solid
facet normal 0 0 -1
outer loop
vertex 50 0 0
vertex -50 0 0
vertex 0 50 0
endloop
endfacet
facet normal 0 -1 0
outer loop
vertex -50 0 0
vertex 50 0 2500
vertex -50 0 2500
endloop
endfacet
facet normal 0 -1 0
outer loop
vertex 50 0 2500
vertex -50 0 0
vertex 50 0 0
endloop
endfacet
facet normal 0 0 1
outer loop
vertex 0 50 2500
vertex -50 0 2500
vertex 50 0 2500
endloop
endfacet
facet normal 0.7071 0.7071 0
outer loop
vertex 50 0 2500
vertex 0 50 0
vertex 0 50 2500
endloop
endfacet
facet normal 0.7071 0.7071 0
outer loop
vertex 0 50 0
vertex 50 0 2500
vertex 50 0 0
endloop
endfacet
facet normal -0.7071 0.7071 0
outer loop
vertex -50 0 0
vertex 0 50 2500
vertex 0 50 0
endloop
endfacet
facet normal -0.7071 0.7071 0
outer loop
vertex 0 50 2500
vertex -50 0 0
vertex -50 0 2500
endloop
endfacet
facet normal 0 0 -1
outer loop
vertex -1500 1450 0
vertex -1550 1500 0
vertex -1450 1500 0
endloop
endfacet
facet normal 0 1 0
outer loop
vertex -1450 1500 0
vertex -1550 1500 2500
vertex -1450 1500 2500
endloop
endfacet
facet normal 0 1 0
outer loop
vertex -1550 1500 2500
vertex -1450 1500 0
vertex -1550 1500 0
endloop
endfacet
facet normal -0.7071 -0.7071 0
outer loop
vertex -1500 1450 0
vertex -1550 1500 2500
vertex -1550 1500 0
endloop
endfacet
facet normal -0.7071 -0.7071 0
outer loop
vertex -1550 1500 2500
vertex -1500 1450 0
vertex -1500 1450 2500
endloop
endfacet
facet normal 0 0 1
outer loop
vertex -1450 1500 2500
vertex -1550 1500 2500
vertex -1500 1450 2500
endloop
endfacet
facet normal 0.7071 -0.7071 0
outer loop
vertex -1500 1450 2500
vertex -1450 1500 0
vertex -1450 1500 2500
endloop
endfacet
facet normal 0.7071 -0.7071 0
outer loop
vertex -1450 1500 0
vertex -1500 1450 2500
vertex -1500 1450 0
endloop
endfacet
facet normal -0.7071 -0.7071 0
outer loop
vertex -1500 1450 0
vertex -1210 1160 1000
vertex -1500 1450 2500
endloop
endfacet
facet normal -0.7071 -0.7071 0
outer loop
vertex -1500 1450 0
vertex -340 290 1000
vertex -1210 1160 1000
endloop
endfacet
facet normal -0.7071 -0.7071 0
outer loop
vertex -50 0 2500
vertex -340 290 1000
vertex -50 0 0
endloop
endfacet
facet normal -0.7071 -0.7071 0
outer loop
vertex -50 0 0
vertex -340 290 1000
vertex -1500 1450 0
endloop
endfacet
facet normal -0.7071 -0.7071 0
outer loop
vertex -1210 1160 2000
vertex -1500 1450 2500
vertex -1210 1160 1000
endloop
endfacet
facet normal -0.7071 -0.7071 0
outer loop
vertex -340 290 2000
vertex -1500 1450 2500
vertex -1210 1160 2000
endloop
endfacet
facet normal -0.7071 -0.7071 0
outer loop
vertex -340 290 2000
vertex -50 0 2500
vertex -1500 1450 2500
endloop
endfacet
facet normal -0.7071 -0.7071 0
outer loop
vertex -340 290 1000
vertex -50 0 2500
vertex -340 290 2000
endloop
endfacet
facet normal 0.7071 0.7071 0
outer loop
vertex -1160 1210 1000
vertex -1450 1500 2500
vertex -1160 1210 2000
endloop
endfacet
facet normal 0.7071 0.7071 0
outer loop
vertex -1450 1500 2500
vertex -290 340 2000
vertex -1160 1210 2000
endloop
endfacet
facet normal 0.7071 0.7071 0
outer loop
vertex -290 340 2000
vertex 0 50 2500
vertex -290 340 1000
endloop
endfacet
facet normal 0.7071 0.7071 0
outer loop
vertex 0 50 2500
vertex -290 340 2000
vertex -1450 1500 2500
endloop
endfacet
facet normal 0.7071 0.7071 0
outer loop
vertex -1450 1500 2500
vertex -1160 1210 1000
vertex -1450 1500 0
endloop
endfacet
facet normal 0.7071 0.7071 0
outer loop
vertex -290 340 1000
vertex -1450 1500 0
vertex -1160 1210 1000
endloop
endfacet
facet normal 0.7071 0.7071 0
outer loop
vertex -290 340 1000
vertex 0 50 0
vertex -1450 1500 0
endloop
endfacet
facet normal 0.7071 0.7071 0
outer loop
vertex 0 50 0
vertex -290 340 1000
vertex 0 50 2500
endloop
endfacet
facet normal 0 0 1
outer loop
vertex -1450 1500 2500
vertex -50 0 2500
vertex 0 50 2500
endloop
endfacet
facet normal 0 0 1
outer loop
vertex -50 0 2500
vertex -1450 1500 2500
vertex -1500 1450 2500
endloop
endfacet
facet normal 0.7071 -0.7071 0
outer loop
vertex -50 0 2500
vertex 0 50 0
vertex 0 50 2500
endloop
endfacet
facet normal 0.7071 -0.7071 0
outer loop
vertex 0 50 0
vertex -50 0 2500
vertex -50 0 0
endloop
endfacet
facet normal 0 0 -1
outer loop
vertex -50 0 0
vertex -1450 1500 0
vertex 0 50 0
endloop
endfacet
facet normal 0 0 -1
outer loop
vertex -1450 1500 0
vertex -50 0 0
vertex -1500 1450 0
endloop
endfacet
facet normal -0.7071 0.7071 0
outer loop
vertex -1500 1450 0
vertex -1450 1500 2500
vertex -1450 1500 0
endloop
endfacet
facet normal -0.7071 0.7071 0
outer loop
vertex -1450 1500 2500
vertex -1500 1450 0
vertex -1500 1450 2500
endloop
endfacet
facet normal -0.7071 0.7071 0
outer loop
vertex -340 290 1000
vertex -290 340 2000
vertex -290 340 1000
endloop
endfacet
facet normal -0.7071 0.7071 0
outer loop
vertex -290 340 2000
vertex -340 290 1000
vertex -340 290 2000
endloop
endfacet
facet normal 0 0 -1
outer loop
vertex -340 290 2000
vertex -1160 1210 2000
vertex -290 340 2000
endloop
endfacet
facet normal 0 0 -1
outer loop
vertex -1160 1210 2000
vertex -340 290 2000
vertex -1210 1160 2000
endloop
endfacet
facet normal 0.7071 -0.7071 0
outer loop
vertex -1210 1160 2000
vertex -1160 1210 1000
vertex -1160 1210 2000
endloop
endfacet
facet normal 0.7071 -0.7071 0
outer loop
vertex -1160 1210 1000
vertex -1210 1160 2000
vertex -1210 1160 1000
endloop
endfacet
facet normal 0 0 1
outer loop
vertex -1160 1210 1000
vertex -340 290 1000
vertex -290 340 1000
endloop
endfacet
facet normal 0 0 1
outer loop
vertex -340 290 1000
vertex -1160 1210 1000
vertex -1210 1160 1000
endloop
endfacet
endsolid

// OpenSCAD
// file: templates/basic-dims.scad
unit = 1000;

section_width = unit * 1.5;
section_height = unit * 2.5;
section_thickness = unit * 0.1;

rt = sqrt(2);

//  -- Notes --
//  Z is UP
//  X is FORWARD (out of the screen)
// file: modifiers/diagonalize.scad
include <../templates/basic-dims.scad>

module diagonalize_triangle_sketch(t = section_thickness) {
    x = sin(45) * t;
    y = cos(45) * t;

    polygon([
        [0, y],
        [x, 0],
        [0, -y]
    ]);
}

module diagonalize_triangle(t = section_thickness) {
    rotate([0, 0, 90])
    linear_extrude(section_height)
    diagonalize_triangle_sketch(t);
}

module diagonalize2D() {
    thickness = section_thickness / rt;

    trans = (section_thickness/2)*rt/2;
    len_scale = rt - section_thickness / (rt * section_width);

    rotate([0, 0, 45])
    translate([trans, 0, 0])
    scale([len_scale, 1/rt, 1])
    children();
}


module diagonalize3D(w = section_width, t = section_thickness, edges = "trans") {

    trans = (t/2)*rt/2;
    len_scale = rt - t / (rt * w);

    edge_angle = edges == "cis" ? 270 : 180;
    
    diagonalize_triangle(t/rt);

    translate([-w, w, 0])
    rotate([0, 0, edge_angle]) // 180 For continue, -90 (270) for end
    diagonalize_triangle(t/rt);

    rotate([0, 0, 45])
    translate([0, trans, 0])
    scale([1/rt, len_scale, 1])
    children();
}
// file: templates/t_simple-window.scad
include <../templates/basic-dims.scad>

window_width = 0.6 * section_width;
window_height = 0.4 * section_height;
bottom_offset = 0.4 * section_height;

module simple_window_sketch() {
    difference() {
        square([section_width, section_height]);

        translate([
            section_width/2 - window_width/2,
            bottom_offset,
            0])
        square([window_width, window_height]);
    }
}

module simple_window() {
    rotate([90, 0, 90])
    translate([0, 0, -section_thickness/2])
    linear_extrude(section_thickness)
    simple_window_sketch();
}
// main file
include <./templates/t_simple-window.scad>
include <./modifiers/diagonalize.scad>

diagonalize3D()
simple_window(edges="trans");
